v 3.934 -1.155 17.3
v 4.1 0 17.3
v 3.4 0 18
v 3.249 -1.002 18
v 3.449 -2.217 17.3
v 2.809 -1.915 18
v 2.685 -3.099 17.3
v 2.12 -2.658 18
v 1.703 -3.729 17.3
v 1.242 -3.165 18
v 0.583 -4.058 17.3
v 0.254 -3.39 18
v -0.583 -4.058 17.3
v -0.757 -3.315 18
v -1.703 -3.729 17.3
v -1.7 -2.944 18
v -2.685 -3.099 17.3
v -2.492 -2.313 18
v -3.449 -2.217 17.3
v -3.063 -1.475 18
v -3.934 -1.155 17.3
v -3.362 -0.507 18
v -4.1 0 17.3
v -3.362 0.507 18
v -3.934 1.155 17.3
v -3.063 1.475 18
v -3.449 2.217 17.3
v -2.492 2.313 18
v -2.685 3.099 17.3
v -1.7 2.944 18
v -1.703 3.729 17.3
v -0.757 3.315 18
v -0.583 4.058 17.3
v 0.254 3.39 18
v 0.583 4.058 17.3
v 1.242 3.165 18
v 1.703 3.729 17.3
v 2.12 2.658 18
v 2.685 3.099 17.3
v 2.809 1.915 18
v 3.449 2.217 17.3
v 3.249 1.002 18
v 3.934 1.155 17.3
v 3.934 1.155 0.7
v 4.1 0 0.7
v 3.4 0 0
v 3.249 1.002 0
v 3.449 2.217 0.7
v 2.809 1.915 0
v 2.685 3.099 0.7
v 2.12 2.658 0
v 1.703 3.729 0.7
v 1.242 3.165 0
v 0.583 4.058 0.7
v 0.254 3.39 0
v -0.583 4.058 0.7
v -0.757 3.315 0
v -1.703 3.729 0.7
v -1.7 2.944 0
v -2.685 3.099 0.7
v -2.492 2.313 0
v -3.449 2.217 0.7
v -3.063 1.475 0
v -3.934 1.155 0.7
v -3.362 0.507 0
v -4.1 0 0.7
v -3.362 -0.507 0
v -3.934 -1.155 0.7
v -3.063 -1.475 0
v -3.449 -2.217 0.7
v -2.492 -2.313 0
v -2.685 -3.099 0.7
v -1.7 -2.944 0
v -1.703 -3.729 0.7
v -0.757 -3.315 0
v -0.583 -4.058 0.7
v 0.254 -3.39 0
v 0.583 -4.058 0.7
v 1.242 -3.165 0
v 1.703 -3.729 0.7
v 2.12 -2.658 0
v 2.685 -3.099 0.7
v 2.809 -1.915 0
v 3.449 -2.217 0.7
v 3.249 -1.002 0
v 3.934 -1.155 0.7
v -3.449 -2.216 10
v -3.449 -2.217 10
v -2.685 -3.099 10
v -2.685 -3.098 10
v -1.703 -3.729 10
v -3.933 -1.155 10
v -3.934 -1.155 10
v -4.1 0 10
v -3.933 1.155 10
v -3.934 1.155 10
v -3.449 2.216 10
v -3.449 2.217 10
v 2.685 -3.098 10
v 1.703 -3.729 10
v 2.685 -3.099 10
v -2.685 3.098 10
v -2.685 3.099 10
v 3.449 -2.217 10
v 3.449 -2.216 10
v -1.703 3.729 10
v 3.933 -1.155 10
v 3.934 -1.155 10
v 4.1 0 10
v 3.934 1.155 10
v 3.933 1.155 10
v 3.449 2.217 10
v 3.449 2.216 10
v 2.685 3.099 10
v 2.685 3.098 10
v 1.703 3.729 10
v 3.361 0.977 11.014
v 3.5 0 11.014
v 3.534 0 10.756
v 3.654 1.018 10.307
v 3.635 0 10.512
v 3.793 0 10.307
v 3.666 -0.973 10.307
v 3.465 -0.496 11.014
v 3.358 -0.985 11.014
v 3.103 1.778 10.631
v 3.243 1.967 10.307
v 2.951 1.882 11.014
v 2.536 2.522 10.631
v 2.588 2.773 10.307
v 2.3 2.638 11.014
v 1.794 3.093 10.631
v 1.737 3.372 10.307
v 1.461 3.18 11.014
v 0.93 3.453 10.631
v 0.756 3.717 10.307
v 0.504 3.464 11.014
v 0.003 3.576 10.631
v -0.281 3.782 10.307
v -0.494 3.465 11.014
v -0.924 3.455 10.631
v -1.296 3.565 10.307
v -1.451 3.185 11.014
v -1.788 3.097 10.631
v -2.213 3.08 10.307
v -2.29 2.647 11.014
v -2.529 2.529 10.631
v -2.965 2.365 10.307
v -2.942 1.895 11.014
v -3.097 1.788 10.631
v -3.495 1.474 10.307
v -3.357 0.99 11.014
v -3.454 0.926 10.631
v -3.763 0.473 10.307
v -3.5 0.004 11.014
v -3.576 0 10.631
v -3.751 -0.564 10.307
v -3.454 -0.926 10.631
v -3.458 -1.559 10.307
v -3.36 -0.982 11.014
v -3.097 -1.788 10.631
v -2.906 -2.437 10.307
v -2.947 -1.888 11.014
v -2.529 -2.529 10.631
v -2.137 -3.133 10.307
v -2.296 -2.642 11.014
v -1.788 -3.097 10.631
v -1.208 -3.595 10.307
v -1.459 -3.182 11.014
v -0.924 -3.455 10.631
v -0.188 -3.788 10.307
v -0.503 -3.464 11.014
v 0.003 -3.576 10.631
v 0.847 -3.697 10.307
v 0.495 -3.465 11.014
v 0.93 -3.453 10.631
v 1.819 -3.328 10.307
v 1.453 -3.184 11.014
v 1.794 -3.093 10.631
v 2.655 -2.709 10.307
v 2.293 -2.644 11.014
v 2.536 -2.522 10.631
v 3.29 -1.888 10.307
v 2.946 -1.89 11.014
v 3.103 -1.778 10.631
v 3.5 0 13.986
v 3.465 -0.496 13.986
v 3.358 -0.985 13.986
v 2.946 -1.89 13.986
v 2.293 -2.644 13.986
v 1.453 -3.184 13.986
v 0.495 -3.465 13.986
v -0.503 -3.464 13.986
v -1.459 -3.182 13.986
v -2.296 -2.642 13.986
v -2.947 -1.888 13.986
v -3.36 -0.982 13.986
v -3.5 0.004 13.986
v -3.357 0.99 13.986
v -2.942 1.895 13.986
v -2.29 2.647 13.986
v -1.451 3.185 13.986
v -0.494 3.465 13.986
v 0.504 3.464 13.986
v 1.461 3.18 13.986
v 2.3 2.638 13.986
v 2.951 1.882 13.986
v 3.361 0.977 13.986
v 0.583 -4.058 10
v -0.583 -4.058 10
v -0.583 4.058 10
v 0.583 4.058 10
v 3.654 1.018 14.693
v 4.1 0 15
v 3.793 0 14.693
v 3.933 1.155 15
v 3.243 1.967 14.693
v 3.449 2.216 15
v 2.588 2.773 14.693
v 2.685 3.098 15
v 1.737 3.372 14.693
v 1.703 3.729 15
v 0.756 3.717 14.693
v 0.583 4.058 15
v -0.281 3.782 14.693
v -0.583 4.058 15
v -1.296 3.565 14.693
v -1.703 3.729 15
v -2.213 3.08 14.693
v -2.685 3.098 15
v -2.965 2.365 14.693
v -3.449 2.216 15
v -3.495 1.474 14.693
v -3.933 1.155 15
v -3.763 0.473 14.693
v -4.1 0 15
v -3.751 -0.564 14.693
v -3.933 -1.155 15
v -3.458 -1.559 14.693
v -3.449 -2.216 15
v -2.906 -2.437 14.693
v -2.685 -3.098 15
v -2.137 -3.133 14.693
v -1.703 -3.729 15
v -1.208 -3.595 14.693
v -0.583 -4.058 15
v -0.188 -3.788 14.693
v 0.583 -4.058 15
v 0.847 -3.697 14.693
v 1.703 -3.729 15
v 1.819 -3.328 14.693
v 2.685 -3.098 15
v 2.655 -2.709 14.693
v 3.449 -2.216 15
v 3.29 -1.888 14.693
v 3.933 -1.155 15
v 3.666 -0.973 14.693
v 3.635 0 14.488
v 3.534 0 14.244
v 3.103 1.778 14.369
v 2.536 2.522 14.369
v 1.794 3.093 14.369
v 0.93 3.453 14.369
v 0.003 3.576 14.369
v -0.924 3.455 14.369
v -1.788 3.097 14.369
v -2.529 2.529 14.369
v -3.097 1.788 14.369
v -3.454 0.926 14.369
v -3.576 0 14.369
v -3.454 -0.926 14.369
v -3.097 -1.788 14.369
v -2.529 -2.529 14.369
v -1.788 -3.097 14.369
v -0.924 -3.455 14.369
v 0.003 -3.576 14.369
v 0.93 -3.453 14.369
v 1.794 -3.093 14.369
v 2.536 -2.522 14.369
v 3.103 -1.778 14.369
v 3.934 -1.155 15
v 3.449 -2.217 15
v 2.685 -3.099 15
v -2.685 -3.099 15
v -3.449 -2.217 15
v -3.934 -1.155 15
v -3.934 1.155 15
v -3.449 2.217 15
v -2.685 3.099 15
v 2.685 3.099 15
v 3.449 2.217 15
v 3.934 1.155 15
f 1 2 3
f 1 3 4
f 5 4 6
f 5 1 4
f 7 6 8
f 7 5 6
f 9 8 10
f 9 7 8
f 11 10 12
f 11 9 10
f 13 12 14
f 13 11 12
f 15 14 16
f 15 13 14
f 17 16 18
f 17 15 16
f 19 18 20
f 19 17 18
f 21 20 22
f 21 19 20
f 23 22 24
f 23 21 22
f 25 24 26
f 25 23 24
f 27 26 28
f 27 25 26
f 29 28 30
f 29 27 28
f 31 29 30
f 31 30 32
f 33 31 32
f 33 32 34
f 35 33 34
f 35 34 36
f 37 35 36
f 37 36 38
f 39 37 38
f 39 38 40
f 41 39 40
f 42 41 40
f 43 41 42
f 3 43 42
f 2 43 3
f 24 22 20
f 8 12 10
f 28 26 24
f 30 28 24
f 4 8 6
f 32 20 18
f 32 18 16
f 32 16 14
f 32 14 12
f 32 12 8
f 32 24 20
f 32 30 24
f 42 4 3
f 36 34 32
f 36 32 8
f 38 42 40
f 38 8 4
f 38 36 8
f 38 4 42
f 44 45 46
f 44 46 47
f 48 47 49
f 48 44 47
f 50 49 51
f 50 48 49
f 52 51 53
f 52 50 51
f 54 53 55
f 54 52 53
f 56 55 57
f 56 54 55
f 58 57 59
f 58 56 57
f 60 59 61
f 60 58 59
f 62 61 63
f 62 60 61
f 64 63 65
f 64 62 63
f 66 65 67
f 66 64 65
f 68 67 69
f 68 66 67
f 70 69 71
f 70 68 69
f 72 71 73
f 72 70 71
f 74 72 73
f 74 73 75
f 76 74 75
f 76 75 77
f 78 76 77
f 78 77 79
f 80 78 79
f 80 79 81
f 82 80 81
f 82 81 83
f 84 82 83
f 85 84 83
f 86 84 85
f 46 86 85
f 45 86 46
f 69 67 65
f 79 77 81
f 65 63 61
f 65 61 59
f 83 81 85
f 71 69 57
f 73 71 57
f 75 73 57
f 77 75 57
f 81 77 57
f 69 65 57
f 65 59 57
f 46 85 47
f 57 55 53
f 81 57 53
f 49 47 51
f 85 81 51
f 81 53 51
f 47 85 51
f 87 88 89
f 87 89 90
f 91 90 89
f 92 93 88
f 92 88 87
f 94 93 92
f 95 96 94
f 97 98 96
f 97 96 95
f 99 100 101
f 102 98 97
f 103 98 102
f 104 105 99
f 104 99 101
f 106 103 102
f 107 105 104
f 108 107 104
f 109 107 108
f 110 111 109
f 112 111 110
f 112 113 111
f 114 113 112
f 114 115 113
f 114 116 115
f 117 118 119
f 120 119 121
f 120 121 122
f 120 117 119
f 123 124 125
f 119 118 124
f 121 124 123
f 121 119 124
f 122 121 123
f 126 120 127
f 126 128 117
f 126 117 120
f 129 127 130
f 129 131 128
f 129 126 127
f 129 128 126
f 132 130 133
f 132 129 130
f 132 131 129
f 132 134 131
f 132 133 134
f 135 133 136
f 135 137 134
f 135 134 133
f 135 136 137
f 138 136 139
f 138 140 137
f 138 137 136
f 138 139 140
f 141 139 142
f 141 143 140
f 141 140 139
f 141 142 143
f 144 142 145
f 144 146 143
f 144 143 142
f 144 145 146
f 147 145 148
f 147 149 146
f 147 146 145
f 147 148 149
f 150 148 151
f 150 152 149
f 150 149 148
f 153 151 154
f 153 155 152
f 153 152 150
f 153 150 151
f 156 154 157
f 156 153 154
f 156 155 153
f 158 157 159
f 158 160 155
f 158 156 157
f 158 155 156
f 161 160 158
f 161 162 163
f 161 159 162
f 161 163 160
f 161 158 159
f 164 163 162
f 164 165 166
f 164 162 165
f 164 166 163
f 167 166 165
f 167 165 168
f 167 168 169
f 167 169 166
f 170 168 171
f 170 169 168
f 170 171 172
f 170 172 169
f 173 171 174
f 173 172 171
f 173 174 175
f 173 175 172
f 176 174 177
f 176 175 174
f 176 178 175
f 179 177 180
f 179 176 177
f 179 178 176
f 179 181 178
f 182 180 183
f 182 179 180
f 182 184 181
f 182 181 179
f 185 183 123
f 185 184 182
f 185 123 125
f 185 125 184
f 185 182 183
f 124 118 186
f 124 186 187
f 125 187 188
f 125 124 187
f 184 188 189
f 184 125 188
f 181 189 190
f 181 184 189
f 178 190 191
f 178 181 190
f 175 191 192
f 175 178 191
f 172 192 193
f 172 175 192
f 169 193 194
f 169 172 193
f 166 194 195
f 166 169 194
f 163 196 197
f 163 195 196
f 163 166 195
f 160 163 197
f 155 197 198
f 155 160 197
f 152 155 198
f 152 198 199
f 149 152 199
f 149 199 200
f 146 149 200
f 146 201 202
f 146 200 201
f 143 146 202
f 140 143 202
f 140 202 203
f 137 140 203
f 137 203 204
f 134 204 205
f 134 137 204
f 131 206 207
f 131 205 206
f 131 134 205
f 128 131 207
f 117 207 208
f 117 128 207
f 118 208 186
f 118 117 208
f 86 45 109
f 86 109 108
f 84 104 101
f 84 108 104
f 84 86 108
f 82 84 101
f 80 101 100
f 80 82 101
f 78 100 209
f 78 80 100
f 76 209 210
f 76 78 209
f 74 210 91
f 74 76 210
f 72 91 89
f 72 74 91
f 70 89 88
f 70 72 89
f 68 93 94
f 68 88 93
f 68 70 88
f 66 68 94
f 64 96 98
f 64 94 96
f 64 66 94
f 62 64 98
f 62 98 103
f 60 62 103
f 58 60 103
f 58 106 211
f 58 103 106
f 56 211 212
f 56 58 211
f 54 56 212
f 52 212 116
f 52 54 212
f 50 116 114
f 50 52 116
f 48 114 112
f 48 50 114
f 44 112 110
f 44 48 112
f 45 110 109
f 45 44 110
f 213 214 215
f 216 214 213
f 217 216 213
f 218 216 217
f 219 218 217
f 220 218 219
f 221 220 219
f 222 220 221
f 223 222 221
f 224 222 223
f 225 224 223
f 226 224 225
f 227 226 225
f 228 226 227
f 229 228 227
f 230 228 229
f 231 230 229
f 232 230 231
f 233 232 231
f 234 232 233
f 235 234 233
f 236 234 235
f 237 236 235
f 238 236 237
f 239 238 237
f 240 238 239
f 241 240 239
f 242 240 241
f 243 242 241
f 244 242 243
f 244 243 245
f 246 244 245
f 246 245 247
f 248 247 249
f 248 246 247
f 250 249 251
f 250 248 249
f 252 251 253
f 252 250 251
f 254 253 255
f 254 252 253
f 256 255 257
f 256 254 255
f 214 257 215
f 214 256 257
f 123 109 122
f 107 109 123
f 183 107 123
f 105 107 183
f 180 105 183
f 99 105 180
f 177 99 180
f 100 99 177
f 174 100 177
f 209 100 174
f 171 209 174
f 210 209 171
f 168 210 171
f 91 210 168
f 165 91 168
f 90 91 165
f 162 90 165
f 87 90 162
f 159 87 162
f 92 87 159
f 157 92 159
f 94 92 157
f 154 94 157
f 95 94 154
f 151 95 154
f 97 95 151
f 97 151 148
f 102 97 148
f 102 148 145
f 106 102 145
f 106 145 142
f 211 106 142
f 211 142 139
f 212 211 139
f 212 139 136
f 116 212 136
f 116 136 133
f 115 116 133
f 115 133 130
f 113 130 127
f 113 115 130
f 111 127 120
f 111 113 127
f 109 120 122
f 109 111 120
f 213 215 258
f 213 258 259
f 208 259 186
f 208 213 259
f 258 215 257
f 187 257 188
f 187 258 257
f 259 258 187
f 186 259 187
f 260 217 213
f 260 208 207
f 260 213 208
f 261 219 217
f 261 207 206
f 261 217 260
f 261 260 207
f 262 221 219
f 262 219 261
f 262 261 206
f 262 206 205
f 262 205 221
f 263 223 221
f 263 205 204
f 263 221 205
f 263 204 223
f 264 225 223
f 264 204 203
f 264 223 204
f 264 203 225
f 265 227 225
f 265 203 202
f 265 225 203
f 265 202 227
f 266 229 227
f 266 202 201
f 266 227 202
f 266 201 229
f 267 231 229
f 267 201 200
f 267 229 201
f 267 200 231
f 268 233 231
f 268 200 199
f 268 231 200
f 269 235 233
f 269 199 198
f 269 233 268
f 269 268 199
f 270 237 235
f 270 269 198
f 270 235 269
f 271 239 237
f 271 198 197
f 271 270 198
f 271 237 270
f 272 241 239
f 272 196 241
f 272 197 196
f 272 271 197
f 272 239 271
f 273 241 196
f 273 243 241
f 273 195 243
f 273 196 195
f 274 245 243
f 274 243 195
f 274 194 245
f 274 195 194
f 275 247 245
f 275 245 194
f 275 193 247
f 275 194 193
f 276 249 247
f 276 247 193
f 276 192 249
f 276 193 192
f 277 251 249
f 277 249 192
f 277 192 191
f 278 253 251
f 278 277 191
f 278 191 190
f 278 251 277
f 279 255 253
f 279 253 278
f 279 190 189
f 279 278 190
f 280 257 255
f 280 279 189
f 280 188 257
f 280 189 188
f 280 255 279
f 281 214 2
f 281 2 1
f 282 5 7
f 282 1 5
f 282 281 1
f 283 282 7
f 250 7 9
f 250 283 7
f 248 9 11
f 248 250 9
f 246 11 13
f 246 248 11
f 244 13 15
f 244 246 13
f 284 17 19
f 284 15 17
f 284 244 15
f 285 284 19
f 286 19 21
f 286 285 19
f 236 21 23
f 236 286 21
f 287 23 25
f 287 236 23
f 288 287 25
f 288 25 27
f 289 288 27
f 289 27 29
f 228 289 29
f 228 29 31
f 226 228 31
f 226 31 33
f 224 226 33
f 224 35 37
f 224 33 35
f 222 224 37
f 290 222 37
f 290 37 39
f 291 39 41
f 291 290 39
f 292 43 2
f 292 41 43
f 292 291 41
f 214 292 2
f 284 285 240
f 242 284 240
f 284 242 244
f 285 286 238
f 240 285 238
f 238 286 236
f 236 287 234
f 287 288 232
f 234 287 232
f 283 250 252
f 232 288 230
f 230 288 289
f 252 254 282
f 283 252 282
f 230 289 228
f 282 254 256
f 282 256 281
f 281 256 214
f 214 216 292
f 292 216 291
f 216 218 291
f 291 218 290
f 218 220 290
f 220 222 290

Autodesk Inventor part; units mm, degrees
ref_plane "YZ Plane" through (0, 0, 0) normal (1, 0, 0) x (0, 1, 0)
ref_plane "XZ Plane" through (0, 0, 0) normal (0, 1, 0) x (-1, 0, 0)
ref_plane "XY Plane" through (0, 0, 0) normal (0, 0, 1) x (1, 0, 0)
sketch "スケッチ1" plane through (0, 0, 0) normal (0, 0, 1) x (1, 0, 0)
  circle A0 centre (0, 0) radius 4.1
  dimension "d0" = 8.2
extrude "押し出し1" add sketch "スケッチ1" along normal blind 10
sketch "スケッチ2" plane through (0, 0, 10) normal (0, 0, 1) x (1, 0, 0)
  circle A0 centre (0, 0) radius 3.5
  dimension "d3" = 7
extrude "押し出し2" add sketch "スケッチ2" along normal blind 5
sketch "スケッチ3" plane through (0, 0, 15) normal (0, 0, 1) x (1, 0, 0)
  circle A0 centre (0, 0) radius 4.1
  circle A1 centre (0, 0) radius 4.1 projected
  circle A2 centre (0, 0) radius 4.1 projected
  point P0 (0, 4.1)
extrude "押し出し3" add sketch "スケッチ3" along normal blind 3
chamfer "面取り1" distance 0.6 angle 45 2 edges at (-3.5, 0, 10) (-3.5, 0, 15)
chamfer "面取り2" distance 0.7 angle 45 2 edges at (-4.1, 0, 18) (-4.1, 0, 0)
fillet "フィレット1" radius 1 2 edges at (-3.5, 0, 10.5995) (-3.5, 0, 14.4005)
properties part number "stopper_inhibitory"
